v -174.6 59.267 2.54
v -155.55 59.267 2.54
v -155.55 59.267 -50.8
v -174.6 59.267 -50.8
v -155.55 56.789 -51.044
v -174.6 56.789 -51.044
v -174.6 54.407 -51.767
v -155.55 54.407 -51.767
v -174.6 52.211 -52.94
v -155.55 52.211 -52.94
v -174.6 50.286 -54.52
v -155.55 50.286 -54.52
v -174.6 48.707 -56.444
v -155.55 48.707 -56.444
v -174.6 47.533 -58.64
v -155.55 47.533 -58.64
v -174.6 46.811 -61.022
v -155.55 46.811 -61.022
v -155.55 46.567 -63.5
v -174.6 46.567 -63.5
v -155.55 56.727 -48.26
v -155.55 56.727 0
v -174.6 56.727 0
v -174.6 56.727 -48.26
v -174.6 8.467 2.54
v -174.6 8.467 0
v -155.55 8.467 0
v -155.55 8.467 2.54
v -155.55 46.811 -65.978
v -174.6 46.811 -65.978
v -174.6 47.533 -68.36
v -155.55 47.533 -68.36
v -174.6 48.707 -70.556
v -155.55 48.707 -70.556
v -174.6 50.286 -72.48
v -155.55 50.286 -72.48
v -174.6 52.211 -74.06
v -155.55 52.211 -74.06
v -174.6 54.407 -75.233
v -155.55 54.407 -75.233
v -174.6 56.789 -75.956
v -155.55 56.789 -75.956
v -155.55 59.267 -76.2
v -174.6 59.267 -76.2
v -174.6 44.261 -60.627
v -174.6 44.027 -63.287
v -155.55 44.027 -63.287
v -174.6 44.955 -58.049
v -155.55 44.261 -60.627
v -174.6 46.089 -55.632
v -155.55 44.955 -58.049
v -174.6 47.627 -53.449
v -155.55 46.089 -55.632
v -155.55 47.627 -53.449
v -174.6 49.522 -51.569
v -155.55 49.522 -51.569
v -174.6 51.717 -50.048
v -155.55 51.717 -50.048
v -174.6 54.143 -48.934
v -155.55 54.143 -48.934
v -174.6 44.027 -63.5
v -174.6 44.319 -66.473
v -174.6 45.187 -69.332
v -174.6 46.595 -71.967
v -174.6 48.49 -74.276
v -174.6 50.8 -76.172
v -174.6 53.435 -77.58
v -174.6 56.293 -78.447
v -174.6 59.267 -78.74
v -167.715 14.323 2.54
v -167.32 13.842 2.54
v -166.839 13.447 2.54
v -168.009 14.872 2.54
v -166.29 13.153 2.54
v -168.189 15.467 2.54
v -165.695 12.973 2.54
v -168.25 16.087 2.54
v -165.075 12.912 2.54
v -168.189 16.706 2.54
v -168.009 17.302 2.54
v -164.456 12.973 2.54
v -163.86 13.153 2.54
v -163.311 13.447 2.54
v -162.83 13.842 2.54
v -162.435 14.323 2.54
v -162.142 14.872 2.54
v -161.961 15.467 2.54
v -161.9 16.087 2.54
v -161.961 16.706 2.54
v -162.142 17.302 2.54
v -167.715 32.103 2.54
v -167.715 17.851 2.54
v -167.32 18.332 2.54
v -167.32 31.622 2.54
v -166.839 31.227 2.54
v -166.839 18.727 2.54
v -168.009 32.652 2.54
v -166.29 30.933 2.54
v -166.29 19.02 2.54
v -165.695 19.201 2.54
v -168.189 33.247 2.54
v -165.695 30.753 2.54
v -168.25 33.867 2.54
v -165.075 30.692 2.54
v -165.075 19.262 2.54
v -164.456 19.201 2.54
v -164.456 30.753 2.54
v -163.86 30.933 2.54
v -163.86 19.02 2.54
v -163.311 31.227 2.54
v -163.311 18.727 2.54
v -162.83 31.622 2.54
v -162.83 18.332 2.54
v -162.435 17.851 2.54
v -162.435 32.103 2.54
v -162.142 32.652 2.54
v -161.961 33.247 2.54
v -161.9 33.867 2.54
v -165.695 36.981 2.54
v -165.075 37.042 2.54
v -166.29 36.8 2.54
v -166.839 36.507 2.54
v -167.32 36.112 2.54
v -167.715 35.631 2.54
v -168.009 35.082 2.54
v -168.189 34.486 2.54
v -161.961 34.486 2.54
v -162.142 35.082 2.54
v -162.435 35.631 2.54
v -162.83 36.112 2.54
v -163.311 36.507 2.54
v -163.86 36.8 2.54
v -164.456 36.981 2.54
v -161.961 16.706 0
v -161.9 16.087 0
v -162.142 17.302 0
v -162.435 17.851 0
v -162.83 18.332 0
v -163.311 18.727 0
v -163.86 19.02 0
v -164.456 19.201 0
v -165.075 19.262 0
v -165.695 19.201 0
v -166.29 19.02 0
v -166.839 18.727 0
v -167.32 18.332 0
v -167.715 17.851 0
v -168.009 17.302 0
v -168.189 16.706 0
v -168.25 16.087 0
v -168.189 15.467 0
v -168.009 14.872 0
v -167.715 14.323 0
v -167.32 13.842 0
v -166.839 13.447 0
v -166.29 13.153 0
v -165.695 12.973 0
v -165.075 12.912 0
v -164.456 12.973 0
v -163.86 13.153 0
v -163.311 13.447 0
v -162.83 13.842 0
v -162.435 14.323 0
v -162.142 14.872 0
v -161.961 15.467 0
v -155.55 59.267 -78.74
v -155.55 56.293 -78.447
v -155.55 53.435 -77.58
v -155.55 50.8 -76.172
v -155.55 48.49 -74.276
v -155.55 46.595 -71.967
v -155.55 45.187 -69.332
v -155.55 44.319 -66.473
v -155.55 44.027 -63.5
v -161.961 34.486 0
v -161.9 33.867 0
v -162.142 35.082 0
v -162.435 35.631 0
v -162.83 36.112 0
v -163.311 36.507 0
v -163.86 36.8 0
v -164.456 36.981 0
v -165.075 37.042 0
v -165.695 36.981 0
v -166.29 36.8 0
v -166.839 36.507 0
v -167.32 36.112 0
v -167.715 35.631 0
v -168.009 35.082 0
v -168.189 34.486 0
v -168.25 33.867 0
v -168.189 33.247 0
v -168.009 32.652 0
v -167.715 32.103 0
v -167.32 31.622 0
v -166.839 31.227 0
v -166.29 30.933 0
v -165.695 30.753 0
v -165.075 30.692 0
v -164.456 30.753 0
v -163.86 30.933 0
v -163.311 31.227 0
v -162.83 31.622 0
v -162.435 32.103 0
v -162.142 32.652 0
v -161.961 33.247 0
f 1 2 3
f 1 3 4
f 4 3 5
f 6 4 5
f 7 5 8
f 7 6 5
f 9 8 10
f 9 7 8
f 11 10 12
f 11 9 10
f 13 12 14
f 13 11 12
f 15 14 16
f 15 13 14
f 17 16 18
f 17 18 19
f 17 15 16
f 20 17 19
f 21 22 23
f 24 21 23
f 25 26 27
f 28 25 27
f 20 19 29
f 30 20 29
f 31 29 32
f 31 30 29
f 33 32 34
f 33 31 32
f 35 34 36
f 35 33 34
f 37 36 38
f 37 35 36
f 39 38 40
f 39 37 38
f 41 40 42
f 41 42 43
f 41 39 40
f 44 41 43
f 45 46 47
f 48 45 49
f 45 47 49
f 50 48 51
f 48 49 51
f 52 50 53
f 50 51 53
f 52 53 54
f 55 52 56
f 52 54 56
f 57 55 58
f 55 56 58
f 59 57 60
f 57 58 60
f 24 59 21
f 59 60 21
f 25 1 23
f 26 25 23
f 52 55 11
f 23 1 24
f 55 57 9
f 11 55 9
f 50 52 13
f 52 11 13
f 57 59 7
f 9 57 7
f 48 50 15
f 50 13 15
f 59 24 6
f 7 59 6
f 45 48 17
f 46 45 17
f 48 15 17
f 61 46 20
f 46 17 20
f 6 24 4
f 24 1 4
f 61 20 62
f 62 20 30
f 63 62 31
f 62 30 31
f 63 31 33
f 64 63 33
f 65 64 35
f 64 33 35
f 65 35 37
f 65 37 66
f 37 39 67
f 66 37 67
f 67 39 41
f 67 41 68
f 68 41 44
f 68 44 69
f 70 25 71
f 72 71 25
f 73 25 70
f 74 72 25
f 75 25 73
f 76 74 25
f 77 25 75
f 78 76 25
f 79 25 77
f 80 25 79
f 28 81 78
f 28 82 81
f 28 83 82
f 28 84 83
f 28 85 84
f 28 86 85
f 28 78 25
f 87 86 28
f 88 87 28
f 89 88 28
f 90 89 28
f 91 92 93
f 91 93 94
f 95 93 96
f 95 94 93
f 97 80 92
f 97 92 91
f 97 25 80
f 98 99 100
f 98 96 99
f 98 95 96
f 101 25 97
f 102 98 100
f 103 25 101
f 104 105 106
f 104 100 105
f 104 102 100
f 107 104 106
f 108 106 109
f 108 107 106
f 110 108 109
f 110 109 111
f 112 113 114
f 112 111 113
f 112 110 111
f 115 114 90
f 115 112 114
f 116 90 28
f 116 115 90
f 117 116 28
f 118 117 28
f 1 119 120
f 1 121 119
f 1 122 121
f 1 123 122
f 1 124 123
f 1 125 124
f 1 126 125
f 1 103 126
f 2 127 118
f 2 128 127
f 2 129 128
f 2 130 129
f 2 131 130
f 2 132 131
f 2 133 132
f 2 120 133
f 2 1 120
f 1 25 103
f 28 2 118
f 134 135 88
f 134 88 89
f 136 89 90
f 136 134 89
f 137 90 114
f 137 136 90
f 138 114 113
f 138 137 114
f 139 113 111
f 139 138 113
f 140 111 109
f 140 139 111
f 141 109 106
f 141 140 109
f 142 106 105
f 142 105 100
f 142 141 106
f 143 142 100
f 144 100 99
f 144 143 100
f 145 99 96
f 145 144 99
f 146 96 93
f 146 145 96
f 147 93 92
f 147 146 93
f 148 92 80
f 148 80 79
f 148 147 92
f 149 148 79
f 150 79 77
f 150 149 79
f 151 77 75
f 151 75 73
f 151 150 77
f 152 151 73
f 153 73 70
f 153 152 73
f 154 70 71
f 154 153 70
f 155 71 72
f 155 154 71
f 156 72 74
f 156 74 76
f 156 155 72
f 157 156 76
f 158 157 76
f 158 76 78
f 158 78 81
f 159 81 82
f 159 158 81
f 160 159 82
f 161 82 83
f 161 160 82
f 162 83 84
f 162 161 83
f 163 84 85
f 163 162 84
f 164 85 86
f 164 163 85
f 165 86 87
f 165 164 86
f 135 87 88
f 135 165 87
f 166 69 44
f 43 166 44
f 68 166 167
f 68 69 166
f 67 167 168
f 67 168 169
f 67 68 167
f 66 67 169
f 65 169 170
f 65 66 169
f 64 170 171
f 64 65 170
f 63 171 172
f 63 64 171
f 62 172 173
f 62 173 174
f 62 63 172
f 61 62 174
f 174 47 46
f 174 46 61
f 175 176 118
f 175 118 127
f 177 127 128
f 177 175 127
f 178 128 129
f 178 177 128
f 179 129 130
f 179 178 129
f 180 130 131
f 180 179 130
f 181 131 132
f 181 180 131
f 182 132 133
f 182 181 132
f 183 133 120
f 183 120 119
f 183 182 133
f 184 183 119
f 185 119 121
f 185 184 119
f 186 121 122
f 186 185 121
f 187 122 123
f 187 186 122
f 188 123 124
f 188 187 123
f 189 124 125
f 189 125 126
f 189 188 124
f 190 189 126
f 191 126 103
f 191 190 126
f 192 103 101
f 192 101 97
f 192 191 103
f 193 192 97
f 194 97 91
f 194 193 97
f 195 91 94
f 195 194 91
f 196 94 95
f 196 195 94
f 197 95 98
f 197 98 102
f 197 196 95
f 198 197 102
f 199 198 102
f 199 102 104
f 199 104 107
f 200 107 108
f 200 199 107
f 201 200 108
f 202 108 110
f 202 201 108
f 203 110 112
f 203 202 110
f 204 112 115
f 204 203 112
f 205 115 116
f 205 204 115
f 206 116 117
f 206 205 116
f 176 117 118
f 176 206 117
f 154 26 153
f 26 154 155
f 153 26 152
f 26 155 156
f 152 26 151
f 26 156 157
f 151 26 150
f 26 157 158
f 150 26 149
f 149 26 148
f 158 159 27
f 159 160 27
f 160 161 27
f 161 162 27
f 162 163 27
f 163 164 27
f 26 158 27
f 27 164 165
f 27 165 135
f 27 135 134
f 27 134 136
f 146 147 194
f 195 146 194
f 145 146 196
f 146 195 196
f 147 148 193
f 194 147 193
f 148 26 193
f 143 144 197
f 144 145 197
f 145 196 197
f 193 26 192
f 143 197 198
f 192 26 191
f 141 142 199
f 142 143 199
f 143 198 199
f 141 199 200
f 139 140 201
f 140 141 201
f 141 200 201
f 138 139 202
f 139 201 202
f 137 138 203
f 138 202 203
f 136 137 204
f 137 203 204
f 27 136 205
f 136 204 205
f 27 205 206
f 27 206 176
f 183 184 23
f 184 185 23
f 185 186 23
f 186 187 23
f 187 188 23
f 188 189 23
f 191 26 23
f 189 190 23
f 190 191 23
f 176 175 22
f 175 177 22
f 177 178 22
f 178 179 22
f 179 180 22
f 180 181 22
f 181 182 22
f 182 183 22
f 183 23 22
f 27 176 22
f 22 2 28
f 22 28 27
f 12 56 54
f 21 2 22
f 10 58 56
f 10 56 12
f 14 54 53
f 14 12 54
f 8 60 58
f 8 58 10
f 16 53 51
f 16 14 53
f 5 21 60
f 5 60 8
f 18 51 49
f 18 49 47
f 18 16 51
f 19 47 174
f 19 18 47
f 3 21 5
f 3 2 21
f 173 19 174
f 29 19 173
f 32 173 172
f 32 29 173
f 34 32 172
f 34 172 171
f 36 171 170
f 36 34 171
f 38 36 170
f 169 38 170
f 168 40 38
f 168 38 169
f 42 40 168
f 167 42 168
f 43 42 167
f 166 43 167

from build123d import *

# Parameters (mm, degrees)
SKETCH1_W           = 19.05
SKETCH1_H           = 50.8
SKETCH1_R           = 3.175
BOSS_EXTRUDE1_DEPTH = 2.54
SKETCH2_W           = 19.05
SKETCH2_H           = 2.54
BOSS_EXTRUDE2_DEPTH = 50.8
BOSS_EXTRUDE5_DEPTH = 19.05
FILLET6_R           = 12.7
FILLET7_R           = 15.24
FILLET11_R          = 12.7
FILLET12_R          = 15.24


# Some blends are built 0.0001 mm under size
with BuildPart() as part:
    # Sketch1 → Boss-Extrude1 (new body)
    with BuildSketch(Plane.XY):
        with Locations((-165.075387597, 33.866666667)):
            Rectangle(SKETCH1_W, SKETCH1_H)
        with Locations((-165.075387597, 16.086666667)):
            Circle(SKETCH1_R, mode=Mode.SUBTRACT)
        with Locations((-165.075387597, 33.866666667)):
            Circle(SKETCH1_R, mode=Mode.SUBTRACT)
    extrude(amount=BOSS_EXTRUDE1_DEPTH)

    # Sketch2 → Boss-Extrude2 (add)
    with BuildSketch(Plane(origin=(0, 0, 0), x_dir=(-1, 0, 0), z_dir=(0, 0, -1))):
        with Locations((165.075387597, 57.996666667)):
            Rectangle(SKETCH2_W, SKETCH2_H)
    extrude(amount=BOSS_EXTRUDE2_DEPTH)

    # Sketch4 → Boss-Extrude5 (add)
    with BuildSketch(Plane(origin=(-155.550387597, 0, 0), x_dir=(0, 0, -1), z_dir=(1, 0, 0))):
        Polygon((48.26, 56.726666667), (48.26, 44.026666667), (78.74, 44.026666667), (78.74, 59.266666667), (76.2, 59.266666667), (76.2, 46.566666667), (50.8, 46.566666667), (50.8, 56.726666667), align=None)
    extrude(amount=-BOSS_EXTRUDE5_DEPTH)

    # Fillet6
    fillet6_edges = [part.edges().sort_by_distance(p)[0] for p in [
        (-165.075387597, 46.566666667, -50.8),
    ]]
    fillet(fillet6_edges, radius=FILLET6_R - 0.0001)  # a hair under: the kernel refuses the full size

    # Fillet7
    # the kernel refuses this fillet: 15.24 mm, written as the material it takes off along each edge
    with BuildSketch(Plane(origin=(-117.983280974, 44.026666667, -48.26), x_dir=(0, 0, -1), z_dir=(-1, 0, 0))) as fillet7_piece_1:
        with BuildLine():
            CenterArc((15.026842649, -15.24), FILLET7_R, 90, 80.405931773)
            Line((0, -12.7), (-0.300536853, -12.6492))
            ThreePointArc((-0.300536853, -12.6492), (-0.3048, -6.35), (-0.3048, 0))
            Line((-0.3048, 0), (0, 0.3048))
            Line((0, 0.3048), (15.026842649, 0.3048))
            Line((15.026842649, 0.3048), (15.026842649, 0))
        make_face()
    extrude(amount=94.184213245, mode=Mode.SUBTRACT)

    # Fillet11
    fillet11_edges = [part.edges().sort_by_distance(p)[0] for p in [
        (-165.075387597, 46.566666667, -76.2),
    ]]
    fillet(fillet11_edges, radius=FILLET11_R - 0.0001)  # a hair under: the kernel refuses the full size

    # Fillet12
    fillet12_edges = [part.edges().sort_by_distance(p)[0] for p in [
        (-165.075387597, 44.026666667, -78.74),
    ]]
    fillet(fillet12_edges, radius=FILLET12_R - 0.0001)  # a hair under: the kernel refuses the full size


solid = part.part
